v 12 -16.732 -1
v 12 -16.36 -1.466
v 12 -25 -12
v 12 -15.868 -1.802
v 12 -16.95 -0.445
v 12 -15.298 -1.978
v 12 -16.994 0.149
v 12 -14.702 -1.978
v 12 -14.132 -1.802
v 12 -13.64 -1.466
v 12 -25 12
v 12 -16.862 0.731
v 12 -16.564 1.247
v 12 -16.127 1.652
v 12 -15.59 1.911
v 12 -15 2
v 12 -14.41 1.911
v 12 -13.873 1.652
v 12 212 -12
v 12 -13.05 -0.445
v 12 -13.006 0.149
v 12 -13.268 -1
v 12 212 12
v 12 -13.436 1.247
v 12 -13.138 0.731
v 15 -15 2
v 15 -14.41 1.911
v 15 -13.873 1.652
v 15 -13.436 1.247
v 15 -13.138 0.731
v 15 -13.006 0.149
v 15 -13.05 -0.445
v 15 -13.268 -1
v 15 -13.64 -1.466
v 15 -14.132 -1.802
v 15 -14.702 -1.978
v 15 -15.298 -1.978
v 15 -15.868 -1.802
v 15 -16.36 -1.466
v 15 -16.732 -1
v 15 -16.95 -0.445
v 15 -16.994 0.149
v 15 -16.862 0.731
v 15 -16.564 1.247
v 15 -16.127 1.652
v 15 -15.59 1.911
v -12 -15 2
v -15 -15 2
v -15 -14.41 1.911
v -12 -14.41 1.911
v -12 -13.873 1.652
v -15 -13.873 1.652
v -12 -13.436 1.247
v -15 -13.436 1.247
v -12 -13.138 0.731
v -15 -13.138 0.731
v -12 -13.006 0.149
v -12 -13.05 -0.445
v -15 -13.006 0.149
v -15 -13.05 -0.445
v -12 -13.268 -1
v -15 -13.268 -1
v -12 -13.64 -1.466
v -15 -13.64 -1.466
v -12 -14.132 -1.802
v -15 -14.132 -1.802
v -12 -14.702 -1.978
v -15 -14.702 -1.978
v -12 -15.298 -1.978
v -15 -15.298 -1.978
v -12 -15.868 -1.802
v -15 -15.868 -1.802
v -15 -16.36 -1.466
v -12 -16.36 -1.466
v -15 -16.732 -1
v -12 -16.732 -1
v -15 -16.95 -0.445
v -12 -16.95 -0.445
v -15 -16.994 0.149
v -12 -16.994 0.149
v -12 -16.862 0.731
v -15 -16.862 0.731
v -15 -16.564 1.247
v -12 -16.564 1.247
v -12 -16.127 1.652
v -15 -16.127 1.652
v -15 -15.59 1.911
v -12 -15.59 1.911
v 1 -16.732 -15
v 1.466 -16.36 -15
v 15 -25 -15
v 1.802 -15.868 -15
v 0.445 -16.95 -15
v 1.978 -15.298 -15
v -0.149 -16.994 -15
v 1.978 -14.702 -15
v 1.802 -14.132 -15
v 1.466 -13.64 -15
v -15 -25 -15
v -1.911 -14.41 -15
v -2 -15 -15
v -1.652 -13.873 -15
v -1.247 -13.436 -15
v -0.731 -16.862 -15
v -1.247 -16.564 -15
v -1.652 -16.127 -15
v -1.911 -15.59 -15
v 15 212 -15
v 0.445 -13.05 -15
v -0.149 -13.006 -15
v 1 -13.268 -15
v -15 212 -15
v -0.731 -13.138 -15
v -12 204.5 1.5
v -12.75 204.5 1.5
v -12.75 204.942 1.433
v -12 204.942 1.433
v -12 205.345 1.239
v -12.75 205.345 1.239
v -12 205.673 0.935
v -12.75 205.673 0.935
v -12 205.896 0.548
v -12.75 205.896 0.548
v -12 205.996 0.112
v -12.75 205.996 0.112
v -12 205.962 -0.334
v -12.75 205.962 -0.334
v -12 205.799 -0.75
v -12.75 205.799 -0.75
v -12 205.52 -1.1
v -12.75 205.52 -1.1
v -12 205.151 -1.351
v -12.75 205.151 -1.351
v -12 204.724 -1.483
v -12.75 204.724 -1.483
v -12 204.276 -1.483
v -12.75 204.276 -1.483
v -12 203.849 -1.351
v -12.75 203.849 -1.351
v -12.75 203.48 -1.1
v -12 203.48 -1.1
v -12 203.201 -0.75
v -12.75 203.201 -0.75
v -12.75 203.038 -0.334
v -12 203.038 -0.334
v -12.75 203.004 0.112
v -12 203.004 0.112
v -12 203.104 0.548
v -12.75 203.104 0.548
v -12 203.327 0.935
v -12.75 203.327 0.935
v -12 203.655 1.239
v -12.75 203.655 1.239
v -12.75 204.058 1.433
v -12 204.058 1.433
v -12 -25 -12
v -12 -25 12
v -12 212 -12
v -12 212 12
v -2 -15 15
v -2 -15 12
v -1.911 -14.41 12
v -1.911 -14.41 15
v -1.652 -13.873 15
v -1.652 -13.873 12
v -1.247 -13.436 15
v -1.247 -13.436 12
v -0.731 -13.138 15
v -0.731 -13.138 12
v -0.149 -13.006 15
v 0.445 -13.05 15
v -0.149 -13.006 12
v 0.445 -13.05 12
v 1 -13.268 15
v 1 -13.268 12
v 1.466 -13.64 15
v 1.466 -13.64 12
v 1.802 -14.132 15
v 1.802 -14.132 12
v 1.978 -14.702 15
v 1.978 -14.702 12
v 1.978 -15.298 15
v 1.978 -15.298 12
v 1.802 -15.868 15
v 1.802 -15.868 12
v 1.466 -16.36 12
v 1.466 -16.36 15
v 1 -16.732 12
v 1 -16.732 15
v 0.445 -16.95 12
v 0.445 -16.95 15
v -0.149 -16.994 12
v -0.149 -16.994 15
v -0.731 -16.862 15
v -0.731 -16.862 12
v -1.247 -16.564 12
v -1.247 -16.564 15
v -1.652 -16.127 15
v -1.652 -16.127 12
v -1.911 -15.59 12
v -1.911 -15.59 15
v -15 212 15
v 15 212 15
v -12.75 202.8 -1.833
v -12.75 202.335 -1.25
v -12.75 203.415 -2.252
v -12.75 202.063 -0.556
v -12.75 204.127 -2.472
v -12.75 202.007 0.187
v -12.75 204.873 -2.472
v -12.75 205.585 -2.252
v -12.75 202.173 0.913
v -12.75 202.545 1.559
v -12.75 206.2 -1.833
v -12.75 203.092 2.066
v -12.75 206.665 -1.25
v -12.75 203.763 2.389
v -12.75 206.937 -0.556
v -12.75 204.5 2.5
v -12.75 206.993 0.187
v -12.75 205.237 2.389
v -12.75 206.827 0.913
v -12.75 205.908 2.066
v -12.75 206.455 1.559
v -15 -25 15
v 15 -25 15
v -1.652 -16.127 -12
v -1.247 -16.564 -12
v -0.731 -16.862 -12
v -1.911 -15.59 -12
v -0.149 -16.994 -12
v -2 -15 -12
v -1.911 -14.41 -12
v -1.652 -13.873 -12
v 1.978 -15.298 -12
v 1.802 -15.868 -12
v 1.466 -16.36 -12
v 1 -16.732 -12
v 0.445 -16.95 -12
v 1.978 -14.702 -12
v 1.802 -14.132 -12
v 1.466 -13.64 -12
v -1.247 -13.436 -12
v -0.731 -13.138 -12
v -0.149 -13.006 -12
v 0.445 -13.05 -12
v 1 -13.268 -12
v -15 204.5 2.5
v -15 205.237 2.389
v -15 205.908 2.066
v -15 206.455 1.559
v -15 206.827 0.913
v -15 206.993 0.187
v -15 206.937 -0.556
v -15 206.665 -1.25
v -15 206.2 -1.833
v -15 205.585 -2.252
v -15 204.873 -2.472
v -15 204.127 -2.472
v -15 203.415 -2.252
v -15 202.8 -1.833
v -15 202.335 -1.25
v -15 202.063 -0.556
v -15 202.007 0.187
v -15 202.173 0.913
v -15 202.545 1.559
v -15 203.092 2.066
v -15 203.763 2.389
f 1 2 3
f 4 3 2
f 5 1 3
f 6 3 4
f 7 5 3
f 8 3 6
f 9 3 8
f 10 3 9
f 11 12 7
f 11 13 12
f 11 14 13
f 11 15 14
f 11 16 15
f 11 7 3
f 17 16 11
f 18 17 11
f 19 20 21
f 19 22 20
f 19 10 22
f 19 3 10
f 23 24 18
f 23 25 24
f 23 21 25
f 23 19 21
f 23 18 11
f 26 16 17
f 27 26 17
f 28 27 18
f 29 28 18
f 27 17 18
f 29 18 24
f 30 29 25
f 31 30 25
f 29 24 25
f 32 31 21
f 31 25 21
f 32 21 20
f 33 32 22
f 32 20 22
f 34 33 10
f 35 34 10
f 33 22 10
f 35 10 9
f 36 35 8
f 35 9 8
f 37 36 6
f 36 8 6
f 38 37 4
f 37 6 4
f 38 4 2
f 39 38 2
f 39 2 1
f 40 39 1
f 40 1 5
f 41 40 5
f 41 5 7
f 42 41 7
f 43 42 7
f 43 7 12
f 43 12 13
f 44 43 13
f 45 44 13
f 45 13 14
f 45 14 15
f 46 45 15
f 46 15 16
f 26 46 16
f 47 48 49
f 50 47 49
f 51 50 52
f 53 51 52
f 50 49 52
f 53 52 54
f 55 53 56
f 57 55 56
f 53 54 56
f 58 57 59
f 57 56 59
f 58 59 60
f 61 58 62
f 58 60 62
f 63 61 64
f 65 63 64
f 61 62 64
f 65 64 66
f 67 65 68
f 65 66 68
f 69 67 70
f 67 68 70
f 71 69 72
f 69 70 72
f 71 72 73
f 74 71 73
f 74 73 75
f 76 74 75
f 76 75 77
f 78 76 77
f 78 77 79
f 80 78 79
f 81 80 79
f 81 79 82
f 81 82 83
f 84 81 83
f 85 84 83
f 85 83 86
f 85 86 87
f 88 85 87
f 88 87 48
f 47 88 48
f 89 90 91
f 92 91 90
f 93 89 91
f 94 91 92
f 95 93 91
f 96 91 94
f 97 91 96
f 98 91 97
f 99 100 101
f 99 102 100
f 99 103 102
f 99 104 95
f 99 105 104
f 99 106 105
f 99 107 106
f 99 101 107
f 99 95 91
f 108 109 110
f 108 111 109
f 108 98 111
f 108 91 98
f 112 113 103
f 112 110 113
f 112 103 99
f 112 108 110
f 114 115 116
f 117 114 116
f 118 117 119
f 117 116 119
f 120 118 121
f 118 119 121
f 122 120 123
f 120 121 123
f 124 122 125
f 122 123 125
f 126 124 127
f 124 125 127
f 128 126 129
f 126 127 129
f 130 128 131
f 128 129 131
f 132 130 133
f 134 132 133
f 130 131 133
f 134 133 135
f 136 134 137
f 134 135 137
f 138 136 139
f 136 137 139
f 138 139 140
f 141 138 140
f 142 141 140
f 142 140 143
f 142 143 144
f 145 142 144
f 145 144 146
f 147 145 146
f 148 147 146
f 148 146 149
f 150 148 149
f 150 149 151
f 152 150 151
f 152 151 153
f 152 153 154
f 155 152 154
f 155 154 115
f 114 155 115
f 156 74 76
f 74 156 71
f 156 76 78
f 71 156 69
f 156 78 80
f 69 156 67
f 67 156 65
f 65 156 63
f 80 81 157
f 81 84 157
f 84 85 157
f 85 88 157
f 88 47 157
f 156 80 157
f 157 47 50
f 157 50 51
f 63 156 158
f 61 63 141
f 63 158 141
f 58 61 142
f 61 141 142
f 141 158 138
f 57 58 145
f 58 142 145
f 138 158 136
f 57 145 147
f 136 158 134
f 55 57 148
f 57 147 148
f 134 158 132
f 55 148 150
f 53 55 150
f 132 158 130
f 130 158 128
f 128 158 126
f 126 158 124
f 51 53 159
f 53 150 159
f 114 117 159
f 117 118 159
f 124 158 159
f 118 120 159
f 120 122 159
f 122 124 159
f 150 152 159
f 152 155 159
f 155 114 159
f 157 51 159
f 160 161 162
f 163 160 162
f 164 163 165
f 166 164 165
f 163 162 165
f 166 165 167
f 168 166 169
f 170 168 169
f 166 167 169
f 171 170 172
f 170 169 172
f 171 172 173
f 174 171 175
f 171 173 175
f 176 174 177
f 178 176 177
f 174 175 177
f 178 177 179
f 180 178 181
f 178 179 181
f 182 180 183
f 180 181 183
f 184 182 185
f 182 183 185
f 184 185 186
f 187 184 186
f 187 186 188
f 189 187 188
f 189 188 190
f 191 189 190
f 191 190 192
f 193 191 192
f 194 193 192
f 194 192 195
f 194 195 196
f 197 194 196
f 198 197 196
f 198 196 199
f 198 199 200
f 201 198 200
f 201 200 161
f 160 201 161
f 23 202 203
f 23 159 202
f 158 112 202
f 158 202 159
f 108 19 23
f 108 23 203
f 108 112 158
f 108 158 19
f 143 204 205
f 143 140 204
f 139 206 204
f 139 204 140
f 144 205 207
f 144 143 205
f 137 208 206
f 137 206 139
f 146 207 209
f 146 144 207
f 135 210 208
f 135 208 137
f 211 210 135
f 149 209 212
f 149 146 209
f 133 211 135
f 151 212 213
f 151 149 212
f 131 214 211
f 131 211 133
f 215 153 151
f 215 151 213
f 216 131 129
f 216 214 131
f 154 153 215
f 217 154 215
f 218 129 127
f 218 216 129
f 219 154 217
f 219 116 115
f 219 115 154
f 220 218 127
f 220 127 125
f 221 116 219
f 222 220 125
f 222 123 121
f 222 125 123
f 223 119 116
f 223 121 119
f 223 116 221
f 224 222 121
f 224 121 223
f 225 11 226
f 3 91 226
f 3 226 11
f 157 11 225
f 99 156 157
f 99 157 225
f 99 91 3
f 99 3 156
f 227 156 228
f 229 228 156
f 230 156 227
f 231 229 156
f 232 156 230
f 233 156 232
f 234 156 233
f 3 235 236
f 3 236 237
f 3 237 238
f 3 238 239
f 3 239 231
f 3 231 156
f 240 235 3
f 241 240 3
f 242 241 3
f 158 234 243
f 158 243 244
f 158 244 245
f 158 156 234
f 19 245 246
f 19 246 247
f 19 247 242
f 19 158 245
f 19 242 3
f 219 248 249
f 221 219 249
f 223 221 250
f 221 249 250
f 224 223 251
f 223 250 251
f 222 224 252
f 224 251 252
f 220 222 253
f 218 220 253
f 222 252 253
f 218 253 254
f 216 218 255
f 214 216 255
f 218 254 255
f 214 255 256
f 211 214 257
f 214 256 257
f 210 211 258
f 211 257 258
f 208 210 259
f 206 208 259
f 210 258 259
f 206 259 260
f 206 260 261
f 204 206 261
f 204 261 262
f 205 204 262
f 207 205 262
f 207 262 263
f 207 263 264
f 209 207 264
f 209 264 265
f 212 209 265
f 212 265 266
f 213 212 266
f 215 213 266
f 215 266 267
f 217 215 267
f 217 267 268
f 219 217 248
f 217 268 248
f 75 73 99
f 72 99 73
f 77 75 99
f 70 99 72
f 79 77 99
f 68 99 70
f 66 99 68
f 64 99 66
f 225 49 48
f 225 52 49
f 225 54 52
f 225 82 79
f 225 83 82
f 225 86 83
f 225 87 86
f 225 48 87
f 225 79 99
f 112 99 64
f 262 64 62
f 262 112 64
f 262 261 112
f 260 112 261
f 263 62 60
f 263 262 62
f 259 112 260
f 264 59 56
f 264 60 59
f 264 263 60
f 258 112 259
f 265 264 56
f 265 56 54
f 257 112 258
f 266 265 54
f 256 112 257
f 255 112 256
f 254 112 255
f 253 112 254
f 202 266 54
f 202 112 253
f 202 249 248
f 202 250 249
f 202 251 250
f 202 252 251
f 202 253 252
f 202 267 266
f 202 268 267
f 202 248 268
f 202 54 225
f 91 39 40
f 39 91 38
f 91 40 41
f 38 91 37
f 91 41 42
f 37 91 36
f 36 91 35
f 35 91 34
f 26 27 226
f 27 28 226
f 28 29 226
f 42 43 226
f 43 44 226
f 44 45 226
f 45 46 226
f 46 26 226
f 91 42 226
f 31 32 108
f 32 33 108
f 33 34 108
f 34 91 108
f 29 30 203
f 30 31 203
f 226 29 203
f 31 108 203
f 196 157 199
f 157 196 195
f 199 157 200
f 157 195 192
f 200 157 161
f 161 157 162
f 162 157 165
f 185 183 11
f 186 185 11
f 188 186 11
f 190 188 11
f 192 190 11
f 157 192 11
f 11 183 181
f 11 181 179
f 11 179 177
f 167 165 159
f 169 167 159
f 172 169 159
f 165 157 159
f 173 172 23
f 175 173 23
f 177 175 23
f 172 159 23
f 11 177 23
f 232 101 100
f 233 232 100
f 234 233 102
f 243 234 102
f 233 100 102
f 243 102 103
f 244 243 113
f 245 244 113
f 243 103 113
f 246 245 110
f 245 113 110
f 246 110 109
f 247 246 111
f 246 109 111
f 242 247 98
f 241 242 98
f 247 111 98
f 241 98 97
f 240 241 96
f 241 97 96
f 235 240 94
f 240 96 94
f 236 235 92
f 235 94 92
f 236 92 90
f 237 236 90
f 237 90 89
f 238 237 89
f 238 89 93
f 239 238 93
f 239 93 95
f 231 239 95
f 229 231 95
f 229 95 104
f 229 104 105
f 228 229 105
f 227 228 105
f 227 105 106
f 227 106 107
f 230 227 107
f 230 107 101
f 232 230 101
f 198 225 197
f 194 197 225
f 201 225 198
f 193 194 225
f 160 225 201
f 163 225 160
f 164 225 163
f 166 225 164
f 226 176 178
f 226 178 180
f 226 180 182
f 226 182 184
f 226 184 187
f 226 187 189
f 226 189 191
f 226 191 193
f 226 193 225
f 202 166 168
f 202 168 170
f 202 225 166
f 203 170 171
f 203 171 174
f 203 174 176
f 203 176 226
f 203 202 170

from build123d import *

# Parameters (mm, degrees)
CROQUIS1_W               = 30
CROQUIS1_H               = 30
CROQUIS1_W_2             = 26
CROQUIS1_H_2             = 26
SALIENTE_EXTRUIR3_DEPTH  = 230
CROQUIS2_W               = 62.135011277
CROQUIS2_H               = 81.929382736
CORTAR_EXTRUIR3_DEPTH    = 28
CROQUIS3_R               = 2
CORTAR_EXTRUIR9_DEPTH    = 15
CROQUIS4_R               = 2
CORTAR_EXTRUIR10_DEPTH   = 15
CROQUIS5_W               = 30
CROQUIS5_H               = 30
CROQUIS5_W_2             = 26
CROQUIS5_H_2             = 26
SALIENTE_EXTRUIR6_DEPTH  = 12
CROQUIS7_W               = 18.119956634
CROQUIS7_H               = 38.019551867
SALIENTE_EXTRUIR7_DEPTH  = 2
CROQUIS8_W               = 19.256572939
CROQUIS8_H               = 35.130037486
SALIENTE_EXTRUIR8_DEPTH  = 2
CROQUIS9_R               = 2
CORTAR_EXTRUIR11_DEPTH   = 2
CROQUIS10_R              = 2
CORTAR_EXTRUIR12_DEPTH   = 2
CROQUIS11_W              = 68.798737931
CROQUIS11_H              = 42.92716572
CORTAR_EXTRUIR14_DEPTH   = 2
CROQUIS12_R              = 2
SALIENTE_EXTRUIR9_DEPTH  = 2
CROQUIS13_R              = 2
SALIENTE_EXTRUIR10_DEPTH = 2
CROQUIS14_R              = 1.5
CORTAR_EXTRUIR18_DEPTH   = 20
CROQUIS16_W              = 26
CROQUIS16_H              = 26
CROQUIS16_W_2            = 24
CROQUIS16_H_2            = 24
SALIENTE_EXTRUIR11_DEPTH = 212
CROQUIS17_R              = 1.5
CORTAR_EXTRUIR20_DEPTH   = 6
CROQUIS18_R              = 2.5
CORTAR_EXTRUIR21_DEPTH   = 2.25
CROQUIS19_W              = 30
CROQUIS19_H              = 30
CROQUIS19_W_2            = 24
CROQUIS19_H_2            = 24
SALIENTE_EXTRUIR12_DEPTH = 30
CROQUIS20_R              = 2
SALIENTE_EXTRUIR13_DEPTH = 2
CROQUIS21_R              = 2
SALIENTE_EXTRUIR14_DEPTH = 2
CROQUIS22_R              = 2
CORTAR_EXTRUIR22_DEPTH   = 52
CROQUIS23_R              = 2
CORTAR_EXTRUIR23_DEPTH   = 52
CROQUIS24_W              = 34.498036884
CROQUIS24_H              = 39.991384426
CORTAR_EXTRUIR24_DEPTH   = 5


with BuildPart() as part:
    # Croquis1 → Saliente-Extruir3 (new body)
    with BuildSketch(Plane(origin=(0, 0, 0), x_dir=(1, 0, 0), z_dir=(0, 1, 0))):
        Rectangle(CROQUIS1_W, CROQUIS1_H)
        Rectangle(CROQUIS1_W_2, CROQUIS1_H_2, mode=Mode.SUBTRACT)
    extrude(amount=SALIENTE_EXTRUIR3_DEPTH)

    # Croquis2 → Cortar-Extruir3 (cut)
    with BuildSketch(Plane(origin=(0, 230, 0), x_dir=(1, 0, 0), z_dir=(0, 1, 0))):
        with Locations((9.148629236, 2.703749702)):
            Rectangle(CROQUIS2_W, CROQUIS2_H)
    extrude(amount=-CORTAR_EXTRUIR3_DEPTH, mode=Mode.SUBTRACT)

    # Croquis3 → Cortar-Extruir9 (cut)
    with BuildSketch(Plane.XY.offset(15)):
        with Locations((3, 169)):
            Circle(CROQUIS3_R)
        with Locations((-3, 191)):
            Circle(CROQUIS3_R)
        with Locations((-3, 33)):
            Circle(CROQUIS3_R)
        with Locations((3, 11)):
            Circle(CROQUIS3_R)
    extrude(amount=-CORTAR_EXTRUIR9_DEPTH, mode=Mode.SUBTRACT)

    # Croquis4 → Cortar-Extruir10 (cut)
    with BuildSketch(Plane(origin=(0, 0, -15), x_dir=(-1, 0, 0), z_dir=(0, 0, -1))):
        with Locations((-3, 191)):
            Circle(CROQUIS4_R)
        with Locations((3, 169)):
            Circle(CROQUIS4_R)
        with Locations((3, 11)):
            Circle(CROQUIS4_R)
        with Locations((-3, 33)):
            Circle(CROQUIS4_R)
    extrude(amount=-CORTAR_EXTRUIR10_DEPTH, mode=Mode.SUBTRACT)

    # Croquis5 → Saliente-Extruir6 (add)
    with BuildSketch(Plane(origin=(0, 202, 0), x_dir=(1, 0, 0), z_dir=(0, 1, 0))):
        Rectangle(CROQUIS5_W, CROQUIS5_H)
        Rectangle(CROQUIS5_W_2, CROQUIS5_H_2, mode=Mode.SUBTRACT)
    extrude(amount=SALIENTE_EXTRUIR6_DEPTH)

    # Croquis7 → Saliente-Extruir7 (add)
    with BuildSketch(Plane.XY.offset(15)):
        with Locations((-0.954536797, 182.456683749)):
            Rectangle(CROQUIS7_W, CROQUIS7_H)
    extrude(amount=-SALIENTE_EXTRUIR7_DEPTH)

    # Croquis8 → Saliente-Extruir8 (add)
    with BuildSketch(Plane(origin=(0, 0, -15), x_dir=(-1, 0, 0), z_dir=(0, 0, -1))):
        with Locations((1.596533726, 178.910609938)):
            Rectangle(CROQUIS8_W, CROQUIS8_H)
    extrude(amount=-SALIENTE_EXTRUIR8_DEPTH)

    # Croquis9 → Cortar-Extruir11 (cut)
    with BuildSketch(Plane.XY.offset(15)):
        with Locations((-3, 203)):
            Circle(CROQUIS9_R)
        with Locations((3, 181)):
            Circle(CROQUIS9_R)
    extrude(amount=-CORTAR_EXTRUIR11_DEPTH, mode=Mode.SUBTRACT)

    # Croquis10 → Cortar-Extruir12 (cut)
    with BuildSketch(Plane(origin=(0, 0, -15), x_dir=(-1, 0, 0), z_dir=(0, 0, -1))):
        with Locations((-3, 203)):
            Circle(CROQUIS10_R)
        with Locations((3, 181)):
            Circle(CROQUIS10_R)
    extrude(amount=-CORTAR_EXTRUIR12_DEPTH, mode=Mode.SUBTRACT)

    # Croquis11 → Cortar-Extruir14 (cut)
    with BuildSketch(Plane(origin=(0, 214, 0), x_dir=(1, 0, 0), z_dir=(0, 1, 0))):
        with Locations((-6.144488578, -0.254830212)):
            Rectangle(CROQUIS11_W, CROQUIS11_H)
    extrude(amount=-CORTAR_EXTRUIR14_DEPTH, mode=Mode.SUBTRACT)

    # Croquis12 → Saliente-Extruir9 (add)
    with BuildSketch(Plane(origin=(0, 0, -15), x_dir=(-1, 0, 0), z_dir=(0, 0, -1))):
        with Locations((3, 181)):
            Circle(CROQUIS12_R)
        with Locations((-3, 203)):
            Circle(CROQUIS12_R)
    extrude(amount=-SALIENTE_EXTRUIR9_DEPTH)

    # Croquis13 → Saliente-Extruir10 (add)
    with BuildSketch(Plane.XY.offset(15)):
        with Locations((-3, 203)):
            Circle(CROQUIS13_R)
        with Locations((3, 181)):
            Circle(CROQUIS13_R)
    extrude(amount=-SALIENTE_EXTRUIR10_DEPTH)

    # Croquis14 → Cortar-Extruir18 (cut)
    with BuildSketch(Plane.ZY.offset(15)):
        with Locations((0, 204.5)):
            Circle(CROQUIS14_R)
    extrude(amount=-CORTAR_EXTRUIR18_DEPTH, mode=Mode.SUBTRACT)

    # Croquis16 → Saliente-Extruir11 (add)
    with BuildSketch(Plane(origin=(0, 212, 0), x_dir=(1, 0, 0), z_dir=(0, 1, 0))):
        Rectangle(CROQUIS16_W, CROQUIS16_H)
        Rectangle(CROQUIS16_W_2, CROQUIS16_H_2, mode=Mode.SUBTRACT)
    extrude(amount=-SALIENTE_EXTRUIR11_DEPTH)

    # Croquis17 → Cortar-Extruir20 (cut)
    with BuildSketch(Plane.ZY.offset(13)):
        with Locations((0, 204.5)):
            Circle(CROQUIS17_R)
    extrude(amount=-CORTAR_EXTRUIR20_DEPTH, mode=Mode.SUBTRACT)

    # Croquis18 → Cortar-Extruir21 (cut)
    with BuildSketch(Plane.ZY.offset(15)):
        with Locations((0, 204.5)):
            Circle(CROQUIS18_R)
    extrude(amount=-CORTAR_EXTRUIR21_DEPTH, mode=Mode.SUBTRACT)

    # Croquis19 → Saliente-Extruir12 (add)
    with BuildSketch(Plane.XZ):
        Rectangle(CROQUIS19_W, CROQUIS19_H)
        Rectangle(CROQUIS19_W_2, CROQUIS19_H_2, mode=Mode.SUBTRACT)
    extrude(amount=SALIENTE_EXTRUIR12_DEPTH)

    # Croquis20 → Saliente-Extruir13 (add)
    with BuildSketch(Plane.XY.offset(15)):
        with Locations((3, 11)):
            Circle(CROQUIS20_R)
        with Locations((-3, 33)):
            Circle(CROQUIS20_R)
    extrude(amount=-SALIENTE_EXTRUIR13_DEPTH)

    # Croquis21 → Saliente-Extruir14 (add)
    with BuildSketch(Plane(origin=(0, 0, -15), x_dir=(-1, 0, 0), z_dir=(0, 0, -1))):
        with Locations((3, 11)):
            Circle(CROQUIS21_R)
        with Locations((-3, 33)):
            Circle(CROQUIS21_R)
    extrude(amount=-SALIENTE_EXTRUIR14_DEPTH)

    # Croquis22 → Cortar-Extruir22 (cut)
    with BuildSketch(Plane.ZY.offset(15)):
        with Locations((0, -15)):
            Circle(CROQUIS22_R)
    extrude(amount=-CORTAR_EXTRUIR22_DEPTH, mode=Mode.SUBTRACT)

    # Croquis23 → Cortar-Extruir23 (cut)
    with BuildSketch(Plane(origin=(0, 0, -15), x_dir=(-1, 0, 0), z_dir=(0, 0, -1))):
        with Locations((0, -15)):
            Circle(CROQUIS23_R)
    extrude(amount=-CORTAR_EXTRUIR23_DEPTH, mode=Mode.SUBTRACT)

    # Croquis24 → Cortar-Extruir24 (cut)
    with BuildSketch(Plane(origin=(0, -30, 0), x_dir=(-1, 0, 0), z_dir=(0, -1, 0))):
        with Locations((0.940748802, -0.242239461)):
            Rectangle(CROQUIS24_W, CROQUIS24_H)
    extrude(amount=-CORTAR_EXTRUIR24_DEPTH, mode=Mode.SUBTRACT)


solid = part.part
